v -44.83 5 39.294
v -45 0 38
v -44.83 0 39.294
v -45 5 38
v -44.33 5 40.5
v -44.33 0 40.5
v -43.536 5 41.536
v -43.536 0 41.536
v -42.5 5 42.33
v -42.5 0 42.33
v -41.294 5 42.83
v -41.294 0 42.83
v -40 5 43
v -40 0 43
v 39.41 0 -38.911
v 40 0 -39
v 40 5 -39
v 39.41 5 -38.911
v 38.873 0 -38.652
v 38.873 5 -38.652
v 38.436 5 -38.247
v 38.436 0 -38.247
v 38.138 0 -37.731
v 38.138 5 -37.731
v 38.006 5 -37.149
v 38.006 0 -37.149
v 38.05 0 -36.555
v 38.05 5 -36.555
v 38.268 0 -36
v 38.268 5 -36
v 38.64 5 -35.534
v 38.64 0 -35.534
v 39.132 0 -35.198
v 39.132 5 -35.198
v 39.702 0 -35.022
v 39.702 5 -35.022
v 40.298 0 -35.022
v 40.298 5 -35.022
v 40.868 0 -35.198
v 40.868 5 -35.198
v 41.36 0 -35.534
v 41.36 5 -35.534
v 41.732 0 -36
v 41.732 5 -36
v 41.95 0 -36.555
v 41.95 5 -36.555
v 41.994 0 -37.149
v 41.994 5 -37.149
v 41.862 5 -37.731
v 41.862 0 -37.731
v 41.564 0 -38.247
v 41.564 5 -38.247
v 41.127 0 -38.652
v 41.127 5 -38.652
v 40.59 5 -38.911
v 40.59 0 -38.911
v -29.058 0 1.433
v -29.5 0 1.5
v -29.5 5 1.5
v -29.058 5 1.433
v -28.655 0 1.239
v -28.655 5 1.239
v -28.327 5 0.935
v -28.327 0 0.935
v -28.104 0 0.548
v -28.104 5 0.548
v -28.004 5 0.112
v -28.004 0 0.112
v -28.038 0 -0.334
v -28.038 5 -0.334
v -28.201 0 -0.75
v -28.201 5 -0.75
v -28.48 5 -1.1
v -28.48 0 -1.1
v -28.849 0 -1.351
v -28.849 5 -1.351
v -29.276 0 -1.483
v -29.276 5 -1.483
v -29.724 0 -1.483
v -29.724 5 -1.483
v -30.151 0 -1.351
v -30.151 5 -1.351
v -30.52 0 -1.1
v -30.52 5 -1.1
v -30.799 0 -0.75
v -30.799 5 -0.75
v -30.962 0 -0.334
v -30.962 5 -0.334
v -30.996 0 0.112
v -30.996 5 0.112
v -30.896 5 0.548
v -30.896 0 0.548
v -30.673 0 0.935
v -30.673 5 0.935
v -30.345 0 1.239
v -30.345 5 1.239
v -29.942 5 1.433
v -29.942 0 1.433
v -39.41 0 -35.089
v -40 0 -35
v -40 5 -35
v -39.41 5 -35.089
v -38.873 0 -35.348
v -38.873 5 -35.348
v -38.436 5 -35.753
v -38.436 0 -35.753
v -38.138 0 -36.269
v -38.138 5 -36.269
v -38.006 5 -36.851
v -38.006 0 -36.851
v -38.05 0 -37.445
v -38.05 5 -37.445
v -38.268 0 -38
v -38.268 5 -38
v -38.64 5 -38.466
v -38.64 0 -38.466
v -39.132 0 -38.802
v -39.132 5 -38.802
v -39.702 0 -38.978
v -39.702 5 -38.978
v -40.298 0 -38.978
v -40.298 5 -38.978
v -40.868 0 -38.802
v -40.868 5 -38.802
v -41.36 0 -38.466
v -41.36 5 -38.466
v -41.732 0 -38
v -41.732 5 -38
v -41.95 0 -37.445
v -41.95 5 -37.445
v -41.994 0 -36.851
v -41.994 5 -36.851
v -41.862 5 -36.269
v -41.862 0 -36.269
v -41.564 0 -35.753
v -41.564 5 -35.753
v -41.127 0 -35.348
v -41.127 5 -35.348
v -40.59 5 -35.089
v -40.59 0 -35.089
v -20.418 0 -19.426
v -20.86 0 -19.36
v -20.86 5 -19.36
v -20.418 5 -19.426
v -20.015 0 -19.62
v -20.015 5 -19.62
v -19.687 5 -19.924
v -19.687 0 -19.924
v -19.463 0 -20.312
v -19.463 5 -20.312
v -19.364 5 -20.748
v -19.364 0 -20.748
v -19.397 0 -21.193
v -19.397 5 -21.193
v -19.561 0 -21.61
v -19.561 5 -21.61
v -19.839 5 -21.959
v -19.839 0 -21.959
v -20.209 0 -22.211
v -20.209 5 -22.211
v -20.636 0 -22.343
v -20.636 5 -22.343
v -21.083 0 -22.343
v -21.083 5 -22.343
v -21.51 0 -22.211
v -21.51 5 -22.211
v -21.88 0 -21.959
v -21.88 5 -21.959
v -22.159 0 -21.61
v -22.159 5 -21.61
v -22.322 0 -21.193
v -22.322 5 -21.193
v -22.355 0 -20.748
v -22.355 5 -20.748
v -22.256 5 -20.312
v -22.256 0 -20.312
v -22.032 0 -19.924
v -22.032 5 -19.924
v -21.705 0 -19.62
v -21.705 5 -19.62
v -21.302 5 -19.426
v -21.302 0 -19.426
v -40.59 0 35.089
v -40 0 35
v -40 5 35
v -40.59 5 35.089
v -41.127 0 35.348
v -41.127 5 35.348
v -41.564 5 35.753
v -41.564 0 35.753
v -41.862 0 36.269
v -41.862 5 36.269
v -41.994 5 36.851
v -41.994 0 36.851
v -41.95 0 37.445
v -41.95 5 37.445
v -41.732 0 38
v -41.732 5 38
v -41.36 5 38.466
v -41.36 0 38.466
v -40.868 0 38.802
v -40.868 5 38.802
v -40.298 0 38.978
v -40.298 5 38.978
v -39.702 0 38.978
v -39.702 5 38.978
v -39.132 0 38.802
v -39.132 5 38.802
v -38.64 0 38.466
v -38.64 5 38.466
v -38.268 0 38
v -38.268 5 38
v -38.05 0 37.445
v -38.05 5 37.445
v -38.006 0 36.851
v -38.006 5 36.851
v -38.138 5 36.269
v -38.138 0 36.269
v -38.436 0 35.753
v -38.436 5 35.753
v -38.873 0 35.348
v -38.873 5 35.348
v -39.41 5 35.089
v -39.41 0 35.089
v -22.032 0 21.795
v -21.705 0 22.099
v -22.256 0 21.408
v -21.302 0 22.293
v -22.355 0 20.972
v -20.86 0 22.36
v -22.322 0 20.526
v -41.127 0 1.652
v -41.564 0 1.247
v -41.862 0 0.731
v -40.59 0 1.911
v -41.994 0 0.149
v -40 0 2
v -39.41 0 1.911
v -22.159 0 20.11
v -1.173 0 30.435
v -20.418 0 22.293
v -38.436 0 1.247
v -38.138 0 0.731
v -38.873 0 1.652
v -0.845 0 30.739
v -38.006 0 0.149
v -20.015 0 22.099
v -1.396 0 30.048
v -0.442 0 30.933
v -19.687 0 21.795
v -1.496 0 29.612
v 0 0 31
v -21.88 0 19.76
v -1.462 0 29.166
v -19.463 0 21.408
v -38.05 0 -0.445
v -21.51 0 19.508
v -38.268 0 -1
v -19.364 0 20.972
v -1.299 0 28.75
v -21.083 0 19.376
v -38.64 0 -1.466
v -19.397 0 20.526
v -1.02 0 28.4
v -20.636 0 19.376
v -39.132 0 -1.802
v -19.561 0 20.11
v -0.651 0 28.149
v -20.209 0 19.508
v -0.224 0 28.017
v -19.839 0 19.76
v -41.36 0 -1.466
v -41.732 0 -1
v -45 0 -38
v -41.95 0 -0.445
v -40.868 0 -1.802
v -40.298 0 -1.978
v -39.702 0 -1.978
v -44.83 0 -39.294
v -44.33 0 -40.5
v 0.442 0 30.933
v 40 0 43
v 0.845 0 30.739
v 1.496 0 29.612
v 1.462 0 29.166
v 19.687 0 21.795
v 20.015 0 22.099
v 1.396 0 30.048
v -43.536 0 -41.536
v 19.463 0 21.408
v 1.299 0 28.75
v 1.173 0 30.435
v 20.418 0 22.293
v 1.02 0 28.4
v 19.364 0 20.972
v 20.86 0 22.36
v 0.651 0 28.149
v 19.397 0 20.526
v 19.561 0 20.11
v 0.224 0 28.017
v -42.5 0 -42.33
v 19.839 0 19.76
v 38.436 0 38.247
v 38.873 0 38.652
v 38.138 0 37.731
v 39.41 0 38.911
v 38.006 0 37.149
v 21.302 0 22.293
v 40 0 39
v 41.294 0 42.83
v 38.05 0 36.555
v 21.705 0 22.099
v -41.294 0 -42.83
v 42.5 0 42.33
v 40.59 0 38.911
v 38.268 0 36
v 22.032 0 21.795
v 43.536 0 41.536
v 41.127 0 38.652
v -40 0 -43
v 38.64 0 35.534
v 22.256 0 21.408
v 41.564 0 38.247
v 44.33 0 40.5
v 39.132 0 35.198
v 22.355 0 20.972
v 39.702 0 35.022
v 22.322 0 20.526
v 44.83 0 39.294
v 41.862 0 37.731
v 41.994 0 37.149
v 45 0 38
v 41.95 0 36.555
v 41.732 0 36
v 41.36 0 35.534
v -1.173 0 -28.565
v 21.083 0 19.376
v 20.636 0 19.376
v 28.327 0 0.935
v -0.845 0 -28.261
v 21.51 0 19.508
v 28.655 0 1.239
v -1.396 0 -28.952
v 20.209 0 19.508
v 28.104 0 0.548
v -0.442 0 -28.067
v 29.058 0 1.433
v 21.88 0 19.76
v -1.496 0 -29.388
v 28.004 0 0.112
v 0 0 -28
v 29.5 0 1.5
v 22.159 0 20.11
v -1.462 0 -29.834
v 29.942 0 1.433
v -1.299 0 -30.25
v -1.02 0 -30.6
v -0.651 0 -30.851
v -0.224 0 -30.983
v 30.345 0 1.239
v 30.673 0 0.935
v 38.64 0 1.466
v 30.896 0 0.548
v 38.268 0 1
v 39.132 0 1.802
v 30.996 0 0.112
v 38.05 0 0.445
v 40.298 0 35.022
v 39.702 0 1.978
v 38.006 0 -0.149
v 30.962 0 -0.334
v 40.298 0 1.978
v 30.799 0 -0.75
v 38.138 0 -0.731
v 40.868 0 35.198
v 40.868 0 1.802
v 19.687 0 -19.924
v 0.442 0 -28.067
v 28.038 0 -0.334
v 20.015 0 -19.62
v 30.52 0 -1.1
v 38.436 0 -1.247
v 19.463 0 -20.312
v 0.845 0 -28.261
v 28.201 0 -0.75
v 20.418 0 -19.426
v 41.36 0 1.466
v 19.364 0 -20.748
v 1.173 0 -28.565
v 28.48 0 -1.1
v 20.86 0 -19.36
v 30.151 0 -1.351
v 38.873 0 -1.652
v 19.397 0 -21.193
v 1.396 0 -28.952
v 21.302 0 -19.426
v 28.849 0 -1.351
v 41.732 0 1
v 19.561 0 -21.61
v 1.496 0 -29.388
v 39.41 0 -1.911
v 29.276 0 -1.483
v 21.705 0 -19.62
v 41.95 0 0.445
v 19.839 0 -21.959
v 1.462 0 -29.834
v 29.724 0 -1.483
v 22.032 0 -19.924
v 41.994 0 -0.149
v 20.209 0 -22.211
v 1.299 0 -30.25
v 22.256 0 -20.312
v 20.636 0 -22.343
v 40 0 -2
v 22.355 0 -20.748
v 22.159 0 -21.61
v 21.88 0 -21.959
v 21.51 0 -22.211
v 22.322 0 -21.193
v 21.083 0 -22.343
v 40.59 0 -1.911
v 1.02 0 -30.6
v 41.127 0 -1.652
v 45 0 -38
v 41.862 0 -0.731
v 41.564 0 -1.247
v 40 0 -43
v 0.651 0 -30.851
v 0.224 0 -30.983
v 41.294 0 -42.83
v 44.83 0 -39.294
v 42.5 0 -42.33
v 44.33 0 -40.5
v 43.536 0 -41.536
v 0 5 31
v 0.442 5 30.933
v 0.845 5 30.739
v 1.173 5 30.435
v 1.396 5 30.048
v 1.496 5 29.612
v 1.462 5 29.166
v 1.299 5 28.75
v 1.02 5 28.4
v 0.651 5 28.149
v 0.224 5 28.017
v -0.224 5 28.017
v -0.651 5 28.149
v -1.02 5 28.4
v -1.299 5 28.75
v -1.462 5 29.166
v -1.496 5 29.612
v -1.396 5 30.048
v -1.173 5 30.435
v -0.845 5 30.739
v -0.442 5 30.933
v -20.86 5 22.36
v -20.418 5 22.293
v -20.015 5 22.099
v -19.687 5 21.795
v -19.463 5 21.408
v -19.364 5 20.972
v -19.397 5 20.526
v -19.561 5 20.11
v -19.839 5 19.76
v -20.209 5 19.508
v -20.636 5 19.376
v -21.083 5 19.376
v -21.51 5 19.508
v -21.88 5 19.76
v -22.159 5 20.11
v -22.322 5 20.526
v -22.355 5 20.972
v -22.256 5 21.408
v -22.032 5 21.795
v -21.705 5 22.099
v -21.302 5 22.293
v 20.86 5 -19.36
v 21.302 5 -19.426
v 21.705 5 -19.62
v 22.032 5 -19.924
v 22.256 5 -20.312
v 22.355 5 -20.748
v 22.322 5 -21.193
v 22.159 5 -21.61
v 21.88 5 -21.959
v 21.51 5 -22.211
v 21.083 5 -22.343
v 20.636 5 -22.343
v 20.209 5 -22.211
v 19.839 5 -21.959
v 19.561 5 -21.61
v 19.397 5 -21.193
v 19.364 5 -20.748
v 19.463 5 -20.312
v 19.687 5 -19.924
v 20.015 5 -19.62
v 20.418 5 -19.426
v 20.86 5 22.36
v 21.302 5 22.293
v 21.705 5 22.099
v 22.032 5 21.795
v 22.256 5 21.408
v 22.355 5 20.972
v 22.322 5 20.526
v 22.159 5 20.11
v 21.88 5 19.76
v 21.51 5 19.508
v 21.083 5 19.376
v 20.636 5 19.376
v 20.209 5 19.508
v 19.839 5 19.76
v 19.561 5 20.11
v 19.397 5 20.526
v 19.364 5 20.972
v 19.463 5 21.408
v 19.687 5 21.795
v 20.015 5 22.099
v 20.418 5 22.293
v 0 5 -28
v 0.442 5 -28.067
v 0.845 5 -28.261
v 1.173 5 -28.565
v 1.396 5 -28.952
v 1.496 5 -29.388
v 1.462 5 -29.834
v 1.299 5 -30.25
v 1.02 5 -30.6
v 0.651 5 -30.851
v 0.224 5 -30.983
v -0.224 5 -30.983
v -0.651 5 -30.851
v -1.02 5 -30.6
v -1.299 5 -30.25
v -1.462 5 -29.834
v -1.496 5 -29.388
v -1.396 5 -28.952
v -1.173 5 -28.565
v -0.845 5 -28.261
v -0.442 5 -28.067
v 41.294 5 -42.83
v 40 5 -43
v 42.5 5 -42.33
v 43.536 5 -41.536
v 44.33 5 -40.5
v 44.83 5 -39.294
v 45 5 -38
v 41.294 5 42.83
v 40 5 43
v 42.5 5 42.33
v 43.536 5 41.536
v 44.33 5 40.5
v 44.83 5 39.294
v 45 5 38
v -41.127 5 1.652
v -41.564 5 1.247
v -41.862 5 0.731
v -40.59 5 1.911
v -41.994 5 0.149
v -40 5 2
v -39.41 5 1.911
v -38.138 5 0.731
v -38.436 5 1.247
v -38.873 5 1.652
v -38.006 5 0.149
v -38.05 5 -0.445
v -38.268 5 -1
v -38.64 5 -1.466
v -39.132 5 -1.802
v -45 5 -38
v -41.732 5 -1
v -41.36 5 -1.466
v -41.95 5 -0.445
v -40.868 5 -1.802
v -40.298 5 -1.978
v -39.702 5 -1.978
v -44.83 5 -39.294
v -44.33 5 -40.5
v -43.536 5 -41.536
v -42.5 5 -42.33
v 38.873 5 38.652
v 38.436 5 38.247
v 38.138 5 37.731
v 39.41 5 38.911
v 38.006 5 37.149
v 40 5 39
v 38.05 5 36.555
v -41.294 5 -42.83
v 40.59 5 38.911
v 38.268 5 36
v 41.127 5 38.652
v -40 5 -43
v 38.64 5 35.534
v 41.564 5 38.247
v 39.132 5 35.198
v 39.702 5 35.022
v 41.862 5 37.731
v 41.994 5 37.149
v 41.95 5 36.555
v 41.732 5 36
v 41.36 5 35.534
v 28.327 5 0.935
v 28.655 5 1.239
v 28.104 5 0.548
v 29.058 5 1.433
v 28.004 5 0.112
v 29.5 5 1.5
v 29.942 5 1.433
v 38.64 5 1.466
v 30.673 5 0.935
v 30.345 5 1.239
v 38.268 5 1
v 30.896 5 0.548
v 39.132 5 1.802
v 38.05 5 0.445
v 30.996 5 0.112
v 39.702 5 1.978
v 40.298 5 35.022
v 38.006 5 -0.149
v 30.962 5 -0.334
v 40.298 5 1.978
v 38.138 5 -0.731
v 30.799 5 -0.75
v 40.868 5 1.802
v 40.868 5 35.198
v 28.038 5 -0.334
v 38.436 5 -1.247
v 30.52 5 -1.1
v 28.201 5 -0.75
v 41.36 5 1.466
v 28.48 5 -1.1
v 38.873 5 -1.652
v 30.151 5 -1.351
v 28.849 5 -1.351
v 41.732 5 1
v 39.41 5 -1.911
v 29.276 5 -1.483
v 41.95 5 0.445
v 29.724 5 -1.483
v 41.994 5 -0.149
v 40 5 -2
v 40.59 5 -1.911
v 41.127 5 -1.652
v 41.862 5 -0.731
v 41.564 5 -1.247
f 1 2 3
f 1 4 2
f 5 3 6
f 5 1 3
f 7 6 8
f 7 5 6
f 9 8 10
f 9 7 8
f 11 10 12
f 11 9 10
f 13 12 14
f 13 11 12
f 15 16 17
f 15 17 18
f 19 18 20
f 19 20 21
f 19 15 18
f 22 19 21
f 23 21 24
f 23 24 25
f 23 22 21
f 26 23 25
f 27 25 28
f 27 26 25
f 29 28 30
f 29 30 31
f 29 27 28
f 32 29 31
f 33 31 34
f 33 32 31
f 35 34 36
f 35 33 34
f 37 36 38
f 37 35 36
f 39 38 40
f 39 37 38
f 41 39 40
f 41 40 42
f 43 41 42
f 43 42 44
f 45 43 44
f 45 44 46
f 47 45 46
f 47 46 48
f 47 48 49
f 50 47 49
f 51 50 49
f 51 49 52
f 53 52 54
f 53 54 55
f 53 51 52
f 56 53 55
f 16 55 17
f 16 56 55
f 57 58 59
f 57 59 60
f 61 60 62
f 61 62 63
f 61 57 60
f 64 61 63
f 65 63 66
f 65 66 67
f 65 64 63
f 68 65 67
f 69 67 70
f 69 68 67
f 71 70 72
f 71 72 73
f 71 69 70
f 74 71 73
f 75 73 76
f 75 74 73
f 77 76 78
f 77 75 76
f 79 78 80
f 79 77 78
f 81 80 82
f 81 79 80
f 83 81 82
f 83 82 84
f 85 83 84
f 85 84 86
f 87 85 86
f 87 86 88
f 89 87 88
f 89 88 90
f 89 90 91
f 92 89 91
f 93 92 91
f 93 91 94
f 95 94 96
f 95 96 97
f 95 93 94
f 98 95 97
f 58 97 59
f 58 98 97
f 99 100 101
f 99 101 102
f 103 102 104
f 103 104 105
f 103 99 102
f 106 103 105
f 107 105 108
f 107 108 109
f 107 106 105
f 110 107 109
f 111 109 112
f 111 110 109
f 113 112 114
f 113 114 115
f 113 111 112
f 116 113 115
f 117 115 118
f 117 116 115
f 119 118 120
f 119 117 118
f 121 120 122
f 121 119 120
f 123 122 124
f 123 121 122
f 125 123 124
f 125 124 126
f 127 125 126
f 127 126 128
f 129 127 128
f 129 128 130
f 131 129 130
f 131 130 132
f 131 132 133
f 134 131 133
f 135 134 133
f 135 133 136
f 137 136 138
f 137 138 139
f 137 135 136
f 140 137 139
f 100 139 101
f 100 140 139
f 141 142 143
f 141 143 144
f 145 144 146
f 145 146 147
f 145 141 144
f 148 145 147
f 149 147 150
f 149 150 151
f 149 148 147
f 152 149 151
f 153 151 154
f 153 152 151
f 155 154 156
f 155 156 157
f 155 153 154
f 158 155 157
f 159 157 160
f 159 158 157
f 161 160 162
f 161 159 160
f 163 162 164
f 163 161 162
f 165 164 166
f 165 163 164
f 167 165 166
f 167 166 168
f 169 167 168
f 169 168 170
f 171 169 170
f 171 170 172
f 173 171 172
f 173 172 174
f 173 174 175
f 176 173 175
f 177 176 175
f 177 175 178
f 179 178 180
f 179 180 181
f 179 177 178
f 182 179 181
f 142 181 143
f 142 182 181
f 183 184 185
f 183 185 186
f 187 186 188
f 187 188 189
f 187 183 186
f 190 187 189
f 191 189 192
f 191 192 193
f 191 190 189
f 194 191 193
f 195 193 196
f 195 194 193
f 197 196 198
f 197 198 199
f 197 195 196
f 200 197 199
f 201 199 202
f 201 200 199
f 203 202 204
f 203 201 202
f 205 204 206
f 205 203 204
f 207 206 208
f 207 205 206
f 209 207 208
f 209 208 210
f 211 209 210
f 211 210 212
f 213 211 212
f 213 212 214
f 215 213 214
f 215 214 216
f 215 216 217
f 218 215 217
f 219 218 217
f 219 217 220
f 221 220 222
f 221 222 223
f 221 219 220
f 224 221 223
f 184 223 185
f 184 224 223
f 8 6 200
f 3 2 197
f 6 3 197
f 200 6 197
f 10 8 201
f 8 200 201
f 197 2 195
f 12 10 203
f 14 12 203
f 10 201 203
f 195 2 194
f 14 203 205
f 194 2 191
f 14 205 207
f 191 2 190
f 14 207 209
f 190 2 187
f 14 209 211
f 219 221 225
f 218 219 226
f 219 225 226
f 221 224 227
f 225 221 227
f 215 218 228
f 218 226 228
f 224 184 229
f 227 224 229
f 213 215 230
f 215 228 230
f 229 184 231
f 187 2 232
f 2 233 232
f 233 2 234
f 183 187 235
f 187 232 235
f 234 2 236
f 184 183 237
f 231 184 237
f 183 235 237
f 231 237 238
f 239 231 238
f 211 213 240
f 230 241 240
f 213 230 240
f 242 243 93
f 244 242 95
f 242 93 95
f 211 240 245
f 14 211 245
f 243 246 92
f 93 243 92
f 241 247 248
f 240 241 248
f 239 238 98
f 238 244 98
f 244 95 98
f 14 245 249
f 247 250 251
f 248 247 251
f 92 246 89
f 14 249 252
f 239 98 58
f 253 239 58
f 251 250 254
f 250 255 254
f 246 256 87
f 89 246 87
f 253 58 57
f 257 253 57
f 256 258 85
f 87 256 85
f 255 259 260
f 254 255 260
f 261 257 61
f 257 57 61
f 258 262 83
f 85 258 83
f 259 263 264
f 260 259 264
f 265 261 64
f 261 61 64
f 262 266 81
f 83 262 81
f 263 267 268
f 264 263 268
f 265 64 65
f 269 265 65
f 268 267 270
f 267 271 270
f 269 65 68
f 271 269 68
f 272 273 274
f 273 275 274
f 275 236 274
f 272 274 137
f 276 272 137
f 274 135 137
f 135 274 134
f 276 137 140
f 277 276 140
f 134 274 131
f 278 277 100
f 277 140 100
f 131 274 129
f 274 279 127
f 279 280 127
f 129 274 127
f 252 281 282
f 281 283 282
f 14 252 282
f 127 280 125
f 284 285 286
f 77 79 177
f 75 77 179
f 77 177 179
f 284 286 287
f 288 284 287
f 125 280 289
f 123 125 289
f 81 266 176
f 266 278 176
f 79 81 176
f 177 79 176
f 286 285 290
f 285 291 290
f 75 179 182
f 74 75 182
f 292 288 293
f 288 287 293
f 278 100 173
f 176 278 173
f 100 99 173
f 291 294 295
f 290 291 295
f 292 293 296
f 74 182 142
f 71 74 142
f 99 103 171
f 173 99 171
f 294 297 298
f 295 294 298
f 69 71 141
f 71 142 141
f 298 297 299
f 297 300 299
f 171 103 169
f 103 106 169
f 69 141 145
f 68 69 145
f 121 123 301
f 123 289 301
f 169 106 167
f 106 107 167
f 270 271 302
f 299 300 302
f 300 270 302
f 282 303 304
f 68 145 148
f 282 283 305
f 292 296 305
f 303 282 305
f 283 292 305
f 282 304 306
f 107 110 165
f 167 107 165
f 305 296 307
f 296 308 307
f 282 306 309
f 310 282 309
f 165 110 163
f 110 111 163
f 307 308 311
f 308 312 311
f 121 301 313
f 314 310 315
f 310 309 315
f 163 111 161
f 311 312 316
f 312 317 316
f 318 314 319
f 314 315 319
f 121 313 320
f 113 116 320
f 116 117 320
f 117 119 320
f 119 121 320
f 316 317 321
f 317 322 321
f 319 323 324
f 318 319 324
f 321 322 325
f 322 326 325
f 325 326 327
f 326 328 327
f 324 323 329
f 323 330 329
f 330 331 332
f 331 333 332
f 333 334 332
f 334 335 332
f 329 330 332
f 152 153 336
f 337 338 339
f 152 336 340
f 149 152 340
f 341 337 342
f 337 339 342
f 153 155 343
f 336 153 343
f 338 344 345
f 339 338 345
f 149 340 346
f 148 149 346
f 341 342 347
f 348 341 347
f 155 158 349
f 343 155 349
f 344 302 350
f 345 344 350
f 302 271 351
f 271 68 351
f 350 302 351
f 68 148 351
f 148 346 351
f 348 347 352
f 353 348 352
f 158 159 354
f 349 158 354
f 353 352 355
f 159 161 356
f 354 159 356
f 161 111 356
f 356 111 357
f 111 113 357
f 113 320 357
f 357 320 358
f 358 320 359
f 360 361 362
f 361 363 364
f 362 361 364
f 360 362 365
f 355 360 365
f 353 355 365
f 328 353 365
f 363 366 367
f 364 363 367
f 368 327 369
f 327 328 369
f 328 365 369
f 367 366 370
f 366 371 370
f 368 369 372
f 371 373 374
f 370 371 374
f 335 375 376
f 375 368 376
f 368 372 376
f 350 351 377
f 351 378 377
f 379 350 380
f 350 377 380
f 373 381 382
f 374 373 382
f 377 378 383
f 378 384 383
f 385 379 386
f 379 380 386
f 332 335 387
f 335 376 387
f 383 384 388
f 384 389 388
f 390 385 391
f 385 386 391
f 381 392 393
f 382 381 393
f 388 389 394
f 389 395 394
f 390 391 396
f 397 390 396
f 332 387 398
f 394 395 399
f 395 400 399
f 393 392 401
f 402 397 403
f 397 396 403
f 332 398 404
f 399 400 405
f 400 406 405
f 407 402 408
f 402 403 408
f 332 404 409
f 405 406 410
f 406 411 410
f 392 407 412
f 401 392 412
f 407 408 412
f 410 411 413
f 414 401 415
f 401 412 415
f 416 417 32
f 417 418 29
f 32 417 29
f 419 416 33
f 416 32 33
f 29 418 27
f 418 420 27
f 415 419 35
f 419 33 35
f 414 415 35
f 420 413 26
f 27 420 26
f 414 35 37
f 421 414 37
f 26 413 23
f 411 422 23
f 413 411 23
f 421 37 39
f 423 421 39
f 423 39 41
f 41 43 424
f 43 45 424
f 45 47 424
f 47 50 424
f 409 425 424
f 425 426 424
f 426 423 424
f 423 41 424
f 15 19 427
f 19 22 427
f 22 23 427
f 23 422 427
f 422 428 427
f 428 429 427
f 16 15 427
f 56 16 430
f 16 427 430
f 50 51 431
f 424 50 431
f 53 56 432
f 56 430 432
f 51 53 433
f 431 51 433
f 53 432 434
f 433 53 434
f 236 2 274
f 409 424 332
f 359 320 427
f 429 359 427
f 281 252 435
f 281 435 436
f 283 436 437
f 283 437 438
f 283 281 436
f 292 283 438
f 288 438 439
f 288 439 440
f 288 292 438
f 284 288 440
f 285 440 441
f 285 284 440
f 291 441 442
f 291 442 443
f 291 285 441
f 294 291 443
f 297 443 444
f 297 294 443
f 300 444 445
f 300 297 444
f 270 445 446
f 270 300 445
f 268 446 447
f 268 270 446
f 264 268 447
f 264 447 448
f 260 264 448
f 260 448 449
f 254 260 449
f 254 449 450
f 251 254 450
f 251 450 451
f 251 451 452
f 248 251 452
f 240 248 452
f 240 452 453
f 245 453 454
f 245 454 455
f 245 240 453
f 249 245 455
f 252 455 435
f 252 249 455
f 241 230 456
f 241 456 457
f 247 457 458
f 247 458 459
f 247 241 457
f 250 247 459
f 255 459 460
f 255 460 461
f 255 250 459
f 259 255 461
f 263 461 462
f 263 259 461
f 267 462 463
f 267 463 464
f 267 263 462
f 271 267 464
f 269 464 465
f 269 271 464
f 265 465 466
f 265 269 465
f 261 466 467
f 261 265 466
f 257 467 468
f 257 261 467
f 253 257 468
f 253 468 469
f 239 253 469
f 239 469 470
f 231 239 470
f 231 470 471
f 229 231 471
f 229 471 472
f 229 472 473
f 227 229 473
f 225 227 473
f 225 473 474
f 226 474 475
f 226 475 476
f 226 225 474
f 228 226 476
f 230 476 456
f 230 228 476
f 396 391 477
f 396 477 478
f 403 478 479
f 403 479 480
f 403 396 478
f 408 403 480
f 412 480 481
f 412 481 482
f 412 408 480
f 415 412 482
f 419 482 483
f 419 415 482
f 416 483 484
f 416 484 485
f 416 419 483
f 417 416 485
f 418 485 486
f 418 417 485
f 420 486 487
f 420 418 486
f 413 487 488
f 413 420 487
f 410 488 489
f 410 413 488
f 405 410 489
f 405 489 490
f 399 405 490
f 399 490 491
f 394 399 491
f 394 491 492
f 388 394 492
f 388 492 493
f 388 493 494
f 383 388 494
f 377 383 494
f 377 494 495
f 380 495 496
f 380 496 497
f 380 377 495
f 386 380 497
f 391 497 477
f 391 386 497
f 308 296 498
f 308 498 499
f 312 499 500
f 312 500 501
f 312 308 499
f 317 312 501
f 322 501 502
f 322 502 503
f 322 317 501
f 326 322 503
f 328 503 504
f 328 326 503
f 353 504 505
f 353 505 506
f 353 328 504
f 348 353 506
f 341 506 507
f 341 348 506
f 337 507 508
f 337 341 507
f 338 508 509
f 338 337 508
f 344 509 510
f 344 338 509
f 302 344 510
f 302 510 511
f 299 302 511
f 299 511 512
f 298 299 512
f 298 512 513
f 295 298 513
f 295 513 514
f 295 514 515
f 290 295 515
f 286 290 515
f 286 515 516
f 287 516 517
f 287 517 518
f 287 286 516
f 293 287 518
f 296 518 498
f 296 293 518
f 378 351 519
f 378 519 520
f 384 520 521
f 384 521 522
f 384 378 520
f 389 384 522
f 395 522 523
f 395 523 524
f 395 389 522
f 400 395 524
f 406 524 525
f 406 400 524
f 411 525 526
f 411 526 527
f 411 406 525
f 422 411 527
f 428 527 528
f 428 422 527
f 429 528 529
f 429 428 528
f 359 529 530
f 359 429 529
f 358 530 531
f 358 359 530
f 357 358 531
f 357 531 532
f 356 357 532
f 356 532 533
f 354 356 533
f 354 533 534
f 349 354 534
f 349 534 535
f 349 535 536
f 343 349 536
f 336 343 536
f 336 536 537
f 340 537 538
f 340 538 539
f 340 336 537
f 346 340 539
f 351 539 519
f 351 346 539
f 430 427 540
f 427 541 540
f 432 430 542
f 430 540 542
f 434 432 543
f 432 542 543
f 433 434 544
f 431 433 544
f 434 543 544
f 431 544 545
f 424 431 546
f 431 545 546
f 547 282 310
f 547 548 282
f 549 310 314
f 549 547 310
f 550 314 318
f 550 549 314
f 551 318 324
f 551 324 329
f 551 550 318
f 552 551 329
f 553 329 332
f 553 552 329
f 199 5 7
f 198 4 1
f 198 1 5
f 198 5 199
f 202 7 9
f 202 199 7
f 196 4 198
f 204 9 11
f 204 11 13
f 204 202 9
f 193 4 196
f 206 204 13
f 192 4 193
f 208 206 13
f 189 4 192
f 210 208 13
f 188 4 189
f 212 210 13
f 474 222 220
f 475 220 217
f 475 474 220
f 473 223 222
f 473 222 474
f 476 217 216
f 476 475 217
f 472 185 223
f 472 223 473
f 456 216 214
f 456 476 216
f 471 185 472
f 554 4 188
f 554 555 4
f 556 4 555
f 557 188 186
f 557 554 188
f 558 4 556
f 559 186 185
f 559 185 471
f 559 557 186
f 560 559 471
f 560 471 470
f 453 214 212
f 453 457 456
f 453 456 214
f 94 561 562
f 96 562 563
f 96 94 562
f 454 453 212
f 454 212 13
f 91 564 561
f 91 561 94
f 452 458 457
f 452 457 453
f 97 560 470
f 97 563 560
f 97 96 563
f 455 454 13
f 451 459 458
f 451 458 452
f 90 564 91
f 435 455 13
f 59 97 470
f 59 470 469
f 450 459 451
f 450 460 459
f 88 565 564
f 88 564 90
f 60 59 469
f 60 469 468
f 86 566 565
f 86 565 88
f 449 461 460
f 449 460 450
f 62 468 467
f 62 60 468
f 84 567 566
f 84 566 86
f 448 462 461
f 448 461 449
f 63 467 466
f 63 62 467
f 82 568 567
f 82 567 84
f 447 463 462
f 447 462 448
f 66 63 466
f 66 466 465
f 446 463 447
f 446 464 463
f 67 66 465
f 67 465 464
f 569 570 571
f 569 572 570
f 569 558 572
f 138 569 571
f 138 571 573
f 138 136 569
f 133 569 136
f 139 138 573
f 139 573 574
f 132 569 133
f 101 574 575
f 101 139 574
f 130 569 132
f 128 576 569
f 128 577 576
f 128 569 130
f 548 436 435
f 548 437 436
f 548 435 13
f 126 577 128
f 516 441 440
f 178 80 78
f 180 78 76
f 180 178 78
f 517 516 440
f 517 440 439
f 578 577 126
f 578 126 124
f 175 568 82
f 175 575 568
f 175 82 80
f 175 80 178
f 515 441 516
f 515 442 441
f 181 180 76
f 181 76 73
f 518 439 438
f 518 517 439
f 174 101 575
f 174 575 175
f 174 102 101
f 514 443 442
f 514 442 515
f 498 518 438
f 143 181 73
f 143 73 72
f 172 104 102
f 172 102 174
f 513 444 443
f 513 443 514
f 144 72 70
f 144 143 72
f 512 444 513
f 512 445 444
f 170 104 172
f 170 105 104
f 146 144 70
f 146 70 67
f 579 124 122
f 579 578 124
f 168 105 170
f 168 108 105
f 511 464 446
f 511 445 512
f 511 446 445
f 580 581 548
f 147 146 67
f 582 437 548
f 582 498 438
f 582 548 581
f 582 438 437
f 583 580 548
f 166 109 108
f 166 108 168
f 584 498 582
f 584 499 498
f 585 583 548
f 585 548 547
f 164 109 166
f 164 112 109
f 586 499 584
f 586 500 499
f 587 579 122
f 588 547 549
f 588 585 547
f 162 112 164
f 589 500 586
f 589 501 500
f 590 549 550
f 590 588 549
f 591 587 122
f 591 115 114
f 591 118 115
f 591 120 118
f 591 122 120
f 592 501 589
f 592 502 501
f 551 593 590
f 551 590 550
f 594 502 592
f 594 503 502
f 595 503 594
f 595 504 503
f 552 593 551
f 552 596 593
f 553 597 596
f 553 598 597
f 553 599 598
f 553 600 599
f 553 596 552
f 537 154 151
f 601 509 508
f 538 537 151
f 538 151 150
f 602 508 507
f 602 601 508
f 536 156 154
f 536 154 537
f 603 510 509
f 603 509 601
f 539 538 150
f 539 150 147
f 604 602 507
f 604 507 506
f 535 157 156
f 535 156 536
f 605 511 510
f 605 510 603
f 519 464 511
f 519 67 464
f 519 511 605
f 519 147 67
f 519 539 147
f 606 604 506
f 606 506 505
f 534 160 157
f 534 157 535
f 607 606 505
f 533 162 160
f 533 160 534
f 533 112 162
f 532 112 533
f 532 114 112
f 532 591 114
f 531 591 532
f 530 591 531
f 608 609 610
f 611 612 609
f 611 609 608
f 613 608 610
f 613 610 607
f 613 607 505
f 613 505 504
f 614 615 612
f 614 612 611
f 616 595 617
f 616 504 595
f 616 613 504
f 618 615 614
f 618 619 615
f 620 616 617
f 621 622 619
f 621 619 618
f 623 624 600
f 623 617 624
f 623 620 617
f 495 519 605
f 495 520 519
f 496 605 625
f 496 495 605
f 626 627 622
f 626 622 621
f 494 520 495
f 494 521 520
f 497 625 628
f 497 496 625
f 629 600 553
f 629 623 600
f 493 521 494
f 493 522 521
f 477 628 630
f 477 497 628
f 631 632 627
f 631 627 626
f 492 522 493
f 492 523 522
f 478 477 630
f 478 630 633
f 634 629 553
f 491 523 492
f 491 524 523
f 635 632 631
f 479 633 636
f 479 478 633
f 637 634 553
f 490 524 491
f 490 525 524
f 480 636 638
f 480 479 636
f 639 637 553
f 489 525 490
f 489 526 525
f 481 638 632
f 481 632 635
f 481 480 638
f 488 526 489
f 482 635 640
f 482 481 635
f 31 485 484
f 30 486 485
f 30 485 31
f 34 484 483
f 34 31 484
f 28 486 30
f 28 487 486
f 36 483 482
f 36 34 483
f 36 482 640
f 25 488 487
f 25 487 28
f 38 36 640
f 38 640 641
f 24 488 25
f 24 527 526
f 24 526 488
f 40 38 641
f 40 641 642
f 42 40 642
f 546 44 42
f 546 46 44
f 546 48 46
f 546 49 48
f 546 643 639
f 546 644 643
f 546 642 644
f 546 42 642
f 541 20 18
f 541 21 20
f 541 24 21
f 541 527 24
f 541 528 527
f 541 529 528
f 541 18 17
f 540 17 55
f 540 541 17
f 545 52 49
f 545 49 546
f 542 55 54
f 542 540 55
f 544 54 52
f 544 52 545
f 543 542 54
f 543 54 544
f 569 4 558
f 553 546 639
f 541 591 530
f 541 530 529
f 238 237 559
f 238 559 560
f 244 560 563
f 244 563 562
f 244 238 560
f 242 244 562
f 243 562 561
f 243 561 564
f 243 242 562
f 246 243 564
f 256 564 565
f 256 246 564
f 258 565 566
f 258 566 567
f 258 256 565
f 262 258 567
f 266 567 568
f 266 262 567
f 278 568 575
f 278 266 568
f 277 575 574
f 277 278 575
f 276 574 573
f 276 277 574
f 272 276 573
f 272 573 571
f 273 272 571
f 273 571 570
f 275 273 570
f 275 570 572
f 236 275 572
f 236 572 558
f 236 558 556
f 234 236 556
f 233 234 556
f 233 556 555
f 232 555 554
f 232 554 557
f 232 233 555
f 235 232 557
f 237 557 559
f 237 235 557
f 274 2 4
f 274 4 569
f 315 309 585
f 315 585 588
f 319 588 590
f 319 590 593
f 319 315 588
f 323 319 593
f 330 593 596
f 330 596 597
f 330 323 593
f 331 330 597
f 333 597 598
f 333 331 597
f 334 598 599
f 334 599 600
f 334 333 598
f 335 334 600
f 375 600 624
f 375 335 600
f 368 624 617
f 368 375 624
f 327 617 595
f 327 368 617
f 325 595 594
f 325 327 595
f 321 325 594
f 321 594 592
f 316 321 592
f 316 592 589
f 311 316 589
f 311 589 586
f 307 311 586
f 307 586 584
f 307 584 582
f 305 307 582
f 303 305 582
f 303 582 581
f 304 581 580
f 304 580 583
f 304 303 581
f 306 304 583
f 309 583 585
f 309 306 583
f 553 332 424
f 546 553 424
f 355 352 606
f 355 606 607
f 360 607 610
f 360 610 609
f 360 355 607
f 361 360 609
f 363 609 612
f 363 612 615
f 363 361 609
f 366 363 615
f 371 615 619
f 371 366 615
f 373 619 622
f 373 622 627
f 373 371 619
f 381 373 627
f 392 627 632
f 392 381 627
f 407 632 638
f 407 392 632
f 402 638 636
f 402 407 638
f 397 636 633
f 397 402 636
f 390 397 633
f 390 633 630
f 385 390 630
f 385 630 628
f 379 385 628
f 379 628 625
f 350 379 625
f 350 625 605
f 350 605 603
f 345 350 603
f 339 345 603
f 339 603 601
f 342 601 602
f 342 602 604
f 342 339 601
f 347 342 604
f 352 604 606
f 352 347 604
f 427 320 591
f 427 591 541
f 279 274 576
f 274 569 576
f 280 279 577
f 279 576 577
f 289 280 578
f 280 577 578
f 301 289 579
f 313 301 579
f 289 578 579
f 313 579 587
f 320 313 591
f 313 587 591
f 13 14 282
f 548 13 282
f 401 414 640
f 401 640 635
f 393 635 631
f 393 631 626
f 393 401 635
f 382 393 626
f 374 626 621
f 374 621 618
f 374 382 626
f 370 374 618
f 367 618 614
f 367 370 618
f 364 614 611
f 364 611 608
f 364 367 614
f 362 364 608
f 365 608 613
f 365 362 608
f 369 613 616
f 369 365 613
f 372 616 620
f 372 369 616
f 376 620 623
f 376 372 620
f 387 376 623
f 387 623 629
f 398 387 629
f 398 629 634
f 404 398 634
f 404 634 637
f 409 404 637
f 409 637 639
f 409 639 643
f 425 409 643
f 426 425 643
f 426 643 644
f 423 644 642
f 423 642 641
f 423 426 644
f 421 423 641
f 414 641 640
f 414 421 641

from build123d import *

# Parameters (mm, degrees)
SKETCH_1_W      = 90
SKETCH_1_H      = 86
SKETCH_1_R      = 1.5
SKETCH_1_R_2    = 2
EXTRUDE_1_DEPTH = 5
FILLET_1_R      = 5


with BuildPart() as part:
    # 草图1 → 凸台-拉伸1 (new body)
    with BuildSketch(Plane(origin=(0, 0, 0), x_dir=(1, 0, 0), z_dir=(0, 1, 0))):
        Rectangle(SKETCH_1_W, SKETCH_1_H)
        with Locations(Location((0, 29.5, 0), (0, 0, 270))):
            Circle(SKETCH_1_R, mode=Mode.SUBTRACT)
        with Locations(Location((20.859650045, 20.859650045, 0), (0, 0, 270))):
            Circle(SKETCH_1_R, mode=Mode.SUBTRACT)
        with Locations(Location((29.5, 0, 0), (0, 0, 270))):
            Circle(SKETCH_1_R, mode=Mode.SUBTRACT)
        with Locations(Location((20.859650045, -20.859650045, 0), (0, 0, 270))):
            Circle(SKETCH_1_R, mode=Mode.SUBTRACT)
        with Locations(Location((0, -29.5, 0), (0, 0, 270))):
            Circle(SKETCH_1_R, mode=Mode.SUBTRACT)
        with Locations(Location((-20.859650045, -20.859650045, 0), (0, 0, 270))):
            Circle(SKETCH_1_R, mode=Mode.SUBTRACT)
        with Locations(Location((-29.5, 0, 0), (0, 0, 270))):
            Circle(SKETCH_1_R, mode=Mode.SUBTRACT)
        with Locations(Location((-20.859650045, 20.859650045, 0), (0, 0, 270))):
            Circle(SKETCH_1_R, mode=Mode.SUBTRACT)
        with Locations(Location((-40, 0, 0), (0, 0, 270))):
            Circle(SKETCH_1_R_2, mode=Mode.SUBTRACT)
        with Locations(Location((40, 0, 0), (0, 0, 90))):
            Circle(SKETCH_1_R_2, mode=Mode.SUBTRACT)
        with Locations(Location((-40, 37, 0), (0, 0, 270))):
            Circle(SKETCH_1_R_2, mode=Mode.SUBTRACT)
        with Locations(Location((40, 37, 0), (0, 0, 90))):
            Circle(SKETCH_1_R_2, mode=Mode.SUBTRACT)
        with Locations(Location((40, -37, 0), (0, 0, 270))):
            Circle(SKETCH_1_R_2, mode=Mode.SUBTRACT)
        with Locations(Location((-40, -37, 0), (0, 0, 90))):
            Circle(SKETCH_1_R_2, mode=Mode.SUBTRACT)
    extrude(amount=EXTRUDE_1_DEPTH)

    # 圆角1
    fillet_1_edges = [part.edges().sort_by_distance(p)[0] for p in [
        (-45, 2.5, -43),
        (45, 2.5, -43),
        (45, 2.5, 43),
        (-45, 2.5, 43),
    ]]
    fillet(fillet_1_edges, radius=FILLET_1_R)


solid = part.part
